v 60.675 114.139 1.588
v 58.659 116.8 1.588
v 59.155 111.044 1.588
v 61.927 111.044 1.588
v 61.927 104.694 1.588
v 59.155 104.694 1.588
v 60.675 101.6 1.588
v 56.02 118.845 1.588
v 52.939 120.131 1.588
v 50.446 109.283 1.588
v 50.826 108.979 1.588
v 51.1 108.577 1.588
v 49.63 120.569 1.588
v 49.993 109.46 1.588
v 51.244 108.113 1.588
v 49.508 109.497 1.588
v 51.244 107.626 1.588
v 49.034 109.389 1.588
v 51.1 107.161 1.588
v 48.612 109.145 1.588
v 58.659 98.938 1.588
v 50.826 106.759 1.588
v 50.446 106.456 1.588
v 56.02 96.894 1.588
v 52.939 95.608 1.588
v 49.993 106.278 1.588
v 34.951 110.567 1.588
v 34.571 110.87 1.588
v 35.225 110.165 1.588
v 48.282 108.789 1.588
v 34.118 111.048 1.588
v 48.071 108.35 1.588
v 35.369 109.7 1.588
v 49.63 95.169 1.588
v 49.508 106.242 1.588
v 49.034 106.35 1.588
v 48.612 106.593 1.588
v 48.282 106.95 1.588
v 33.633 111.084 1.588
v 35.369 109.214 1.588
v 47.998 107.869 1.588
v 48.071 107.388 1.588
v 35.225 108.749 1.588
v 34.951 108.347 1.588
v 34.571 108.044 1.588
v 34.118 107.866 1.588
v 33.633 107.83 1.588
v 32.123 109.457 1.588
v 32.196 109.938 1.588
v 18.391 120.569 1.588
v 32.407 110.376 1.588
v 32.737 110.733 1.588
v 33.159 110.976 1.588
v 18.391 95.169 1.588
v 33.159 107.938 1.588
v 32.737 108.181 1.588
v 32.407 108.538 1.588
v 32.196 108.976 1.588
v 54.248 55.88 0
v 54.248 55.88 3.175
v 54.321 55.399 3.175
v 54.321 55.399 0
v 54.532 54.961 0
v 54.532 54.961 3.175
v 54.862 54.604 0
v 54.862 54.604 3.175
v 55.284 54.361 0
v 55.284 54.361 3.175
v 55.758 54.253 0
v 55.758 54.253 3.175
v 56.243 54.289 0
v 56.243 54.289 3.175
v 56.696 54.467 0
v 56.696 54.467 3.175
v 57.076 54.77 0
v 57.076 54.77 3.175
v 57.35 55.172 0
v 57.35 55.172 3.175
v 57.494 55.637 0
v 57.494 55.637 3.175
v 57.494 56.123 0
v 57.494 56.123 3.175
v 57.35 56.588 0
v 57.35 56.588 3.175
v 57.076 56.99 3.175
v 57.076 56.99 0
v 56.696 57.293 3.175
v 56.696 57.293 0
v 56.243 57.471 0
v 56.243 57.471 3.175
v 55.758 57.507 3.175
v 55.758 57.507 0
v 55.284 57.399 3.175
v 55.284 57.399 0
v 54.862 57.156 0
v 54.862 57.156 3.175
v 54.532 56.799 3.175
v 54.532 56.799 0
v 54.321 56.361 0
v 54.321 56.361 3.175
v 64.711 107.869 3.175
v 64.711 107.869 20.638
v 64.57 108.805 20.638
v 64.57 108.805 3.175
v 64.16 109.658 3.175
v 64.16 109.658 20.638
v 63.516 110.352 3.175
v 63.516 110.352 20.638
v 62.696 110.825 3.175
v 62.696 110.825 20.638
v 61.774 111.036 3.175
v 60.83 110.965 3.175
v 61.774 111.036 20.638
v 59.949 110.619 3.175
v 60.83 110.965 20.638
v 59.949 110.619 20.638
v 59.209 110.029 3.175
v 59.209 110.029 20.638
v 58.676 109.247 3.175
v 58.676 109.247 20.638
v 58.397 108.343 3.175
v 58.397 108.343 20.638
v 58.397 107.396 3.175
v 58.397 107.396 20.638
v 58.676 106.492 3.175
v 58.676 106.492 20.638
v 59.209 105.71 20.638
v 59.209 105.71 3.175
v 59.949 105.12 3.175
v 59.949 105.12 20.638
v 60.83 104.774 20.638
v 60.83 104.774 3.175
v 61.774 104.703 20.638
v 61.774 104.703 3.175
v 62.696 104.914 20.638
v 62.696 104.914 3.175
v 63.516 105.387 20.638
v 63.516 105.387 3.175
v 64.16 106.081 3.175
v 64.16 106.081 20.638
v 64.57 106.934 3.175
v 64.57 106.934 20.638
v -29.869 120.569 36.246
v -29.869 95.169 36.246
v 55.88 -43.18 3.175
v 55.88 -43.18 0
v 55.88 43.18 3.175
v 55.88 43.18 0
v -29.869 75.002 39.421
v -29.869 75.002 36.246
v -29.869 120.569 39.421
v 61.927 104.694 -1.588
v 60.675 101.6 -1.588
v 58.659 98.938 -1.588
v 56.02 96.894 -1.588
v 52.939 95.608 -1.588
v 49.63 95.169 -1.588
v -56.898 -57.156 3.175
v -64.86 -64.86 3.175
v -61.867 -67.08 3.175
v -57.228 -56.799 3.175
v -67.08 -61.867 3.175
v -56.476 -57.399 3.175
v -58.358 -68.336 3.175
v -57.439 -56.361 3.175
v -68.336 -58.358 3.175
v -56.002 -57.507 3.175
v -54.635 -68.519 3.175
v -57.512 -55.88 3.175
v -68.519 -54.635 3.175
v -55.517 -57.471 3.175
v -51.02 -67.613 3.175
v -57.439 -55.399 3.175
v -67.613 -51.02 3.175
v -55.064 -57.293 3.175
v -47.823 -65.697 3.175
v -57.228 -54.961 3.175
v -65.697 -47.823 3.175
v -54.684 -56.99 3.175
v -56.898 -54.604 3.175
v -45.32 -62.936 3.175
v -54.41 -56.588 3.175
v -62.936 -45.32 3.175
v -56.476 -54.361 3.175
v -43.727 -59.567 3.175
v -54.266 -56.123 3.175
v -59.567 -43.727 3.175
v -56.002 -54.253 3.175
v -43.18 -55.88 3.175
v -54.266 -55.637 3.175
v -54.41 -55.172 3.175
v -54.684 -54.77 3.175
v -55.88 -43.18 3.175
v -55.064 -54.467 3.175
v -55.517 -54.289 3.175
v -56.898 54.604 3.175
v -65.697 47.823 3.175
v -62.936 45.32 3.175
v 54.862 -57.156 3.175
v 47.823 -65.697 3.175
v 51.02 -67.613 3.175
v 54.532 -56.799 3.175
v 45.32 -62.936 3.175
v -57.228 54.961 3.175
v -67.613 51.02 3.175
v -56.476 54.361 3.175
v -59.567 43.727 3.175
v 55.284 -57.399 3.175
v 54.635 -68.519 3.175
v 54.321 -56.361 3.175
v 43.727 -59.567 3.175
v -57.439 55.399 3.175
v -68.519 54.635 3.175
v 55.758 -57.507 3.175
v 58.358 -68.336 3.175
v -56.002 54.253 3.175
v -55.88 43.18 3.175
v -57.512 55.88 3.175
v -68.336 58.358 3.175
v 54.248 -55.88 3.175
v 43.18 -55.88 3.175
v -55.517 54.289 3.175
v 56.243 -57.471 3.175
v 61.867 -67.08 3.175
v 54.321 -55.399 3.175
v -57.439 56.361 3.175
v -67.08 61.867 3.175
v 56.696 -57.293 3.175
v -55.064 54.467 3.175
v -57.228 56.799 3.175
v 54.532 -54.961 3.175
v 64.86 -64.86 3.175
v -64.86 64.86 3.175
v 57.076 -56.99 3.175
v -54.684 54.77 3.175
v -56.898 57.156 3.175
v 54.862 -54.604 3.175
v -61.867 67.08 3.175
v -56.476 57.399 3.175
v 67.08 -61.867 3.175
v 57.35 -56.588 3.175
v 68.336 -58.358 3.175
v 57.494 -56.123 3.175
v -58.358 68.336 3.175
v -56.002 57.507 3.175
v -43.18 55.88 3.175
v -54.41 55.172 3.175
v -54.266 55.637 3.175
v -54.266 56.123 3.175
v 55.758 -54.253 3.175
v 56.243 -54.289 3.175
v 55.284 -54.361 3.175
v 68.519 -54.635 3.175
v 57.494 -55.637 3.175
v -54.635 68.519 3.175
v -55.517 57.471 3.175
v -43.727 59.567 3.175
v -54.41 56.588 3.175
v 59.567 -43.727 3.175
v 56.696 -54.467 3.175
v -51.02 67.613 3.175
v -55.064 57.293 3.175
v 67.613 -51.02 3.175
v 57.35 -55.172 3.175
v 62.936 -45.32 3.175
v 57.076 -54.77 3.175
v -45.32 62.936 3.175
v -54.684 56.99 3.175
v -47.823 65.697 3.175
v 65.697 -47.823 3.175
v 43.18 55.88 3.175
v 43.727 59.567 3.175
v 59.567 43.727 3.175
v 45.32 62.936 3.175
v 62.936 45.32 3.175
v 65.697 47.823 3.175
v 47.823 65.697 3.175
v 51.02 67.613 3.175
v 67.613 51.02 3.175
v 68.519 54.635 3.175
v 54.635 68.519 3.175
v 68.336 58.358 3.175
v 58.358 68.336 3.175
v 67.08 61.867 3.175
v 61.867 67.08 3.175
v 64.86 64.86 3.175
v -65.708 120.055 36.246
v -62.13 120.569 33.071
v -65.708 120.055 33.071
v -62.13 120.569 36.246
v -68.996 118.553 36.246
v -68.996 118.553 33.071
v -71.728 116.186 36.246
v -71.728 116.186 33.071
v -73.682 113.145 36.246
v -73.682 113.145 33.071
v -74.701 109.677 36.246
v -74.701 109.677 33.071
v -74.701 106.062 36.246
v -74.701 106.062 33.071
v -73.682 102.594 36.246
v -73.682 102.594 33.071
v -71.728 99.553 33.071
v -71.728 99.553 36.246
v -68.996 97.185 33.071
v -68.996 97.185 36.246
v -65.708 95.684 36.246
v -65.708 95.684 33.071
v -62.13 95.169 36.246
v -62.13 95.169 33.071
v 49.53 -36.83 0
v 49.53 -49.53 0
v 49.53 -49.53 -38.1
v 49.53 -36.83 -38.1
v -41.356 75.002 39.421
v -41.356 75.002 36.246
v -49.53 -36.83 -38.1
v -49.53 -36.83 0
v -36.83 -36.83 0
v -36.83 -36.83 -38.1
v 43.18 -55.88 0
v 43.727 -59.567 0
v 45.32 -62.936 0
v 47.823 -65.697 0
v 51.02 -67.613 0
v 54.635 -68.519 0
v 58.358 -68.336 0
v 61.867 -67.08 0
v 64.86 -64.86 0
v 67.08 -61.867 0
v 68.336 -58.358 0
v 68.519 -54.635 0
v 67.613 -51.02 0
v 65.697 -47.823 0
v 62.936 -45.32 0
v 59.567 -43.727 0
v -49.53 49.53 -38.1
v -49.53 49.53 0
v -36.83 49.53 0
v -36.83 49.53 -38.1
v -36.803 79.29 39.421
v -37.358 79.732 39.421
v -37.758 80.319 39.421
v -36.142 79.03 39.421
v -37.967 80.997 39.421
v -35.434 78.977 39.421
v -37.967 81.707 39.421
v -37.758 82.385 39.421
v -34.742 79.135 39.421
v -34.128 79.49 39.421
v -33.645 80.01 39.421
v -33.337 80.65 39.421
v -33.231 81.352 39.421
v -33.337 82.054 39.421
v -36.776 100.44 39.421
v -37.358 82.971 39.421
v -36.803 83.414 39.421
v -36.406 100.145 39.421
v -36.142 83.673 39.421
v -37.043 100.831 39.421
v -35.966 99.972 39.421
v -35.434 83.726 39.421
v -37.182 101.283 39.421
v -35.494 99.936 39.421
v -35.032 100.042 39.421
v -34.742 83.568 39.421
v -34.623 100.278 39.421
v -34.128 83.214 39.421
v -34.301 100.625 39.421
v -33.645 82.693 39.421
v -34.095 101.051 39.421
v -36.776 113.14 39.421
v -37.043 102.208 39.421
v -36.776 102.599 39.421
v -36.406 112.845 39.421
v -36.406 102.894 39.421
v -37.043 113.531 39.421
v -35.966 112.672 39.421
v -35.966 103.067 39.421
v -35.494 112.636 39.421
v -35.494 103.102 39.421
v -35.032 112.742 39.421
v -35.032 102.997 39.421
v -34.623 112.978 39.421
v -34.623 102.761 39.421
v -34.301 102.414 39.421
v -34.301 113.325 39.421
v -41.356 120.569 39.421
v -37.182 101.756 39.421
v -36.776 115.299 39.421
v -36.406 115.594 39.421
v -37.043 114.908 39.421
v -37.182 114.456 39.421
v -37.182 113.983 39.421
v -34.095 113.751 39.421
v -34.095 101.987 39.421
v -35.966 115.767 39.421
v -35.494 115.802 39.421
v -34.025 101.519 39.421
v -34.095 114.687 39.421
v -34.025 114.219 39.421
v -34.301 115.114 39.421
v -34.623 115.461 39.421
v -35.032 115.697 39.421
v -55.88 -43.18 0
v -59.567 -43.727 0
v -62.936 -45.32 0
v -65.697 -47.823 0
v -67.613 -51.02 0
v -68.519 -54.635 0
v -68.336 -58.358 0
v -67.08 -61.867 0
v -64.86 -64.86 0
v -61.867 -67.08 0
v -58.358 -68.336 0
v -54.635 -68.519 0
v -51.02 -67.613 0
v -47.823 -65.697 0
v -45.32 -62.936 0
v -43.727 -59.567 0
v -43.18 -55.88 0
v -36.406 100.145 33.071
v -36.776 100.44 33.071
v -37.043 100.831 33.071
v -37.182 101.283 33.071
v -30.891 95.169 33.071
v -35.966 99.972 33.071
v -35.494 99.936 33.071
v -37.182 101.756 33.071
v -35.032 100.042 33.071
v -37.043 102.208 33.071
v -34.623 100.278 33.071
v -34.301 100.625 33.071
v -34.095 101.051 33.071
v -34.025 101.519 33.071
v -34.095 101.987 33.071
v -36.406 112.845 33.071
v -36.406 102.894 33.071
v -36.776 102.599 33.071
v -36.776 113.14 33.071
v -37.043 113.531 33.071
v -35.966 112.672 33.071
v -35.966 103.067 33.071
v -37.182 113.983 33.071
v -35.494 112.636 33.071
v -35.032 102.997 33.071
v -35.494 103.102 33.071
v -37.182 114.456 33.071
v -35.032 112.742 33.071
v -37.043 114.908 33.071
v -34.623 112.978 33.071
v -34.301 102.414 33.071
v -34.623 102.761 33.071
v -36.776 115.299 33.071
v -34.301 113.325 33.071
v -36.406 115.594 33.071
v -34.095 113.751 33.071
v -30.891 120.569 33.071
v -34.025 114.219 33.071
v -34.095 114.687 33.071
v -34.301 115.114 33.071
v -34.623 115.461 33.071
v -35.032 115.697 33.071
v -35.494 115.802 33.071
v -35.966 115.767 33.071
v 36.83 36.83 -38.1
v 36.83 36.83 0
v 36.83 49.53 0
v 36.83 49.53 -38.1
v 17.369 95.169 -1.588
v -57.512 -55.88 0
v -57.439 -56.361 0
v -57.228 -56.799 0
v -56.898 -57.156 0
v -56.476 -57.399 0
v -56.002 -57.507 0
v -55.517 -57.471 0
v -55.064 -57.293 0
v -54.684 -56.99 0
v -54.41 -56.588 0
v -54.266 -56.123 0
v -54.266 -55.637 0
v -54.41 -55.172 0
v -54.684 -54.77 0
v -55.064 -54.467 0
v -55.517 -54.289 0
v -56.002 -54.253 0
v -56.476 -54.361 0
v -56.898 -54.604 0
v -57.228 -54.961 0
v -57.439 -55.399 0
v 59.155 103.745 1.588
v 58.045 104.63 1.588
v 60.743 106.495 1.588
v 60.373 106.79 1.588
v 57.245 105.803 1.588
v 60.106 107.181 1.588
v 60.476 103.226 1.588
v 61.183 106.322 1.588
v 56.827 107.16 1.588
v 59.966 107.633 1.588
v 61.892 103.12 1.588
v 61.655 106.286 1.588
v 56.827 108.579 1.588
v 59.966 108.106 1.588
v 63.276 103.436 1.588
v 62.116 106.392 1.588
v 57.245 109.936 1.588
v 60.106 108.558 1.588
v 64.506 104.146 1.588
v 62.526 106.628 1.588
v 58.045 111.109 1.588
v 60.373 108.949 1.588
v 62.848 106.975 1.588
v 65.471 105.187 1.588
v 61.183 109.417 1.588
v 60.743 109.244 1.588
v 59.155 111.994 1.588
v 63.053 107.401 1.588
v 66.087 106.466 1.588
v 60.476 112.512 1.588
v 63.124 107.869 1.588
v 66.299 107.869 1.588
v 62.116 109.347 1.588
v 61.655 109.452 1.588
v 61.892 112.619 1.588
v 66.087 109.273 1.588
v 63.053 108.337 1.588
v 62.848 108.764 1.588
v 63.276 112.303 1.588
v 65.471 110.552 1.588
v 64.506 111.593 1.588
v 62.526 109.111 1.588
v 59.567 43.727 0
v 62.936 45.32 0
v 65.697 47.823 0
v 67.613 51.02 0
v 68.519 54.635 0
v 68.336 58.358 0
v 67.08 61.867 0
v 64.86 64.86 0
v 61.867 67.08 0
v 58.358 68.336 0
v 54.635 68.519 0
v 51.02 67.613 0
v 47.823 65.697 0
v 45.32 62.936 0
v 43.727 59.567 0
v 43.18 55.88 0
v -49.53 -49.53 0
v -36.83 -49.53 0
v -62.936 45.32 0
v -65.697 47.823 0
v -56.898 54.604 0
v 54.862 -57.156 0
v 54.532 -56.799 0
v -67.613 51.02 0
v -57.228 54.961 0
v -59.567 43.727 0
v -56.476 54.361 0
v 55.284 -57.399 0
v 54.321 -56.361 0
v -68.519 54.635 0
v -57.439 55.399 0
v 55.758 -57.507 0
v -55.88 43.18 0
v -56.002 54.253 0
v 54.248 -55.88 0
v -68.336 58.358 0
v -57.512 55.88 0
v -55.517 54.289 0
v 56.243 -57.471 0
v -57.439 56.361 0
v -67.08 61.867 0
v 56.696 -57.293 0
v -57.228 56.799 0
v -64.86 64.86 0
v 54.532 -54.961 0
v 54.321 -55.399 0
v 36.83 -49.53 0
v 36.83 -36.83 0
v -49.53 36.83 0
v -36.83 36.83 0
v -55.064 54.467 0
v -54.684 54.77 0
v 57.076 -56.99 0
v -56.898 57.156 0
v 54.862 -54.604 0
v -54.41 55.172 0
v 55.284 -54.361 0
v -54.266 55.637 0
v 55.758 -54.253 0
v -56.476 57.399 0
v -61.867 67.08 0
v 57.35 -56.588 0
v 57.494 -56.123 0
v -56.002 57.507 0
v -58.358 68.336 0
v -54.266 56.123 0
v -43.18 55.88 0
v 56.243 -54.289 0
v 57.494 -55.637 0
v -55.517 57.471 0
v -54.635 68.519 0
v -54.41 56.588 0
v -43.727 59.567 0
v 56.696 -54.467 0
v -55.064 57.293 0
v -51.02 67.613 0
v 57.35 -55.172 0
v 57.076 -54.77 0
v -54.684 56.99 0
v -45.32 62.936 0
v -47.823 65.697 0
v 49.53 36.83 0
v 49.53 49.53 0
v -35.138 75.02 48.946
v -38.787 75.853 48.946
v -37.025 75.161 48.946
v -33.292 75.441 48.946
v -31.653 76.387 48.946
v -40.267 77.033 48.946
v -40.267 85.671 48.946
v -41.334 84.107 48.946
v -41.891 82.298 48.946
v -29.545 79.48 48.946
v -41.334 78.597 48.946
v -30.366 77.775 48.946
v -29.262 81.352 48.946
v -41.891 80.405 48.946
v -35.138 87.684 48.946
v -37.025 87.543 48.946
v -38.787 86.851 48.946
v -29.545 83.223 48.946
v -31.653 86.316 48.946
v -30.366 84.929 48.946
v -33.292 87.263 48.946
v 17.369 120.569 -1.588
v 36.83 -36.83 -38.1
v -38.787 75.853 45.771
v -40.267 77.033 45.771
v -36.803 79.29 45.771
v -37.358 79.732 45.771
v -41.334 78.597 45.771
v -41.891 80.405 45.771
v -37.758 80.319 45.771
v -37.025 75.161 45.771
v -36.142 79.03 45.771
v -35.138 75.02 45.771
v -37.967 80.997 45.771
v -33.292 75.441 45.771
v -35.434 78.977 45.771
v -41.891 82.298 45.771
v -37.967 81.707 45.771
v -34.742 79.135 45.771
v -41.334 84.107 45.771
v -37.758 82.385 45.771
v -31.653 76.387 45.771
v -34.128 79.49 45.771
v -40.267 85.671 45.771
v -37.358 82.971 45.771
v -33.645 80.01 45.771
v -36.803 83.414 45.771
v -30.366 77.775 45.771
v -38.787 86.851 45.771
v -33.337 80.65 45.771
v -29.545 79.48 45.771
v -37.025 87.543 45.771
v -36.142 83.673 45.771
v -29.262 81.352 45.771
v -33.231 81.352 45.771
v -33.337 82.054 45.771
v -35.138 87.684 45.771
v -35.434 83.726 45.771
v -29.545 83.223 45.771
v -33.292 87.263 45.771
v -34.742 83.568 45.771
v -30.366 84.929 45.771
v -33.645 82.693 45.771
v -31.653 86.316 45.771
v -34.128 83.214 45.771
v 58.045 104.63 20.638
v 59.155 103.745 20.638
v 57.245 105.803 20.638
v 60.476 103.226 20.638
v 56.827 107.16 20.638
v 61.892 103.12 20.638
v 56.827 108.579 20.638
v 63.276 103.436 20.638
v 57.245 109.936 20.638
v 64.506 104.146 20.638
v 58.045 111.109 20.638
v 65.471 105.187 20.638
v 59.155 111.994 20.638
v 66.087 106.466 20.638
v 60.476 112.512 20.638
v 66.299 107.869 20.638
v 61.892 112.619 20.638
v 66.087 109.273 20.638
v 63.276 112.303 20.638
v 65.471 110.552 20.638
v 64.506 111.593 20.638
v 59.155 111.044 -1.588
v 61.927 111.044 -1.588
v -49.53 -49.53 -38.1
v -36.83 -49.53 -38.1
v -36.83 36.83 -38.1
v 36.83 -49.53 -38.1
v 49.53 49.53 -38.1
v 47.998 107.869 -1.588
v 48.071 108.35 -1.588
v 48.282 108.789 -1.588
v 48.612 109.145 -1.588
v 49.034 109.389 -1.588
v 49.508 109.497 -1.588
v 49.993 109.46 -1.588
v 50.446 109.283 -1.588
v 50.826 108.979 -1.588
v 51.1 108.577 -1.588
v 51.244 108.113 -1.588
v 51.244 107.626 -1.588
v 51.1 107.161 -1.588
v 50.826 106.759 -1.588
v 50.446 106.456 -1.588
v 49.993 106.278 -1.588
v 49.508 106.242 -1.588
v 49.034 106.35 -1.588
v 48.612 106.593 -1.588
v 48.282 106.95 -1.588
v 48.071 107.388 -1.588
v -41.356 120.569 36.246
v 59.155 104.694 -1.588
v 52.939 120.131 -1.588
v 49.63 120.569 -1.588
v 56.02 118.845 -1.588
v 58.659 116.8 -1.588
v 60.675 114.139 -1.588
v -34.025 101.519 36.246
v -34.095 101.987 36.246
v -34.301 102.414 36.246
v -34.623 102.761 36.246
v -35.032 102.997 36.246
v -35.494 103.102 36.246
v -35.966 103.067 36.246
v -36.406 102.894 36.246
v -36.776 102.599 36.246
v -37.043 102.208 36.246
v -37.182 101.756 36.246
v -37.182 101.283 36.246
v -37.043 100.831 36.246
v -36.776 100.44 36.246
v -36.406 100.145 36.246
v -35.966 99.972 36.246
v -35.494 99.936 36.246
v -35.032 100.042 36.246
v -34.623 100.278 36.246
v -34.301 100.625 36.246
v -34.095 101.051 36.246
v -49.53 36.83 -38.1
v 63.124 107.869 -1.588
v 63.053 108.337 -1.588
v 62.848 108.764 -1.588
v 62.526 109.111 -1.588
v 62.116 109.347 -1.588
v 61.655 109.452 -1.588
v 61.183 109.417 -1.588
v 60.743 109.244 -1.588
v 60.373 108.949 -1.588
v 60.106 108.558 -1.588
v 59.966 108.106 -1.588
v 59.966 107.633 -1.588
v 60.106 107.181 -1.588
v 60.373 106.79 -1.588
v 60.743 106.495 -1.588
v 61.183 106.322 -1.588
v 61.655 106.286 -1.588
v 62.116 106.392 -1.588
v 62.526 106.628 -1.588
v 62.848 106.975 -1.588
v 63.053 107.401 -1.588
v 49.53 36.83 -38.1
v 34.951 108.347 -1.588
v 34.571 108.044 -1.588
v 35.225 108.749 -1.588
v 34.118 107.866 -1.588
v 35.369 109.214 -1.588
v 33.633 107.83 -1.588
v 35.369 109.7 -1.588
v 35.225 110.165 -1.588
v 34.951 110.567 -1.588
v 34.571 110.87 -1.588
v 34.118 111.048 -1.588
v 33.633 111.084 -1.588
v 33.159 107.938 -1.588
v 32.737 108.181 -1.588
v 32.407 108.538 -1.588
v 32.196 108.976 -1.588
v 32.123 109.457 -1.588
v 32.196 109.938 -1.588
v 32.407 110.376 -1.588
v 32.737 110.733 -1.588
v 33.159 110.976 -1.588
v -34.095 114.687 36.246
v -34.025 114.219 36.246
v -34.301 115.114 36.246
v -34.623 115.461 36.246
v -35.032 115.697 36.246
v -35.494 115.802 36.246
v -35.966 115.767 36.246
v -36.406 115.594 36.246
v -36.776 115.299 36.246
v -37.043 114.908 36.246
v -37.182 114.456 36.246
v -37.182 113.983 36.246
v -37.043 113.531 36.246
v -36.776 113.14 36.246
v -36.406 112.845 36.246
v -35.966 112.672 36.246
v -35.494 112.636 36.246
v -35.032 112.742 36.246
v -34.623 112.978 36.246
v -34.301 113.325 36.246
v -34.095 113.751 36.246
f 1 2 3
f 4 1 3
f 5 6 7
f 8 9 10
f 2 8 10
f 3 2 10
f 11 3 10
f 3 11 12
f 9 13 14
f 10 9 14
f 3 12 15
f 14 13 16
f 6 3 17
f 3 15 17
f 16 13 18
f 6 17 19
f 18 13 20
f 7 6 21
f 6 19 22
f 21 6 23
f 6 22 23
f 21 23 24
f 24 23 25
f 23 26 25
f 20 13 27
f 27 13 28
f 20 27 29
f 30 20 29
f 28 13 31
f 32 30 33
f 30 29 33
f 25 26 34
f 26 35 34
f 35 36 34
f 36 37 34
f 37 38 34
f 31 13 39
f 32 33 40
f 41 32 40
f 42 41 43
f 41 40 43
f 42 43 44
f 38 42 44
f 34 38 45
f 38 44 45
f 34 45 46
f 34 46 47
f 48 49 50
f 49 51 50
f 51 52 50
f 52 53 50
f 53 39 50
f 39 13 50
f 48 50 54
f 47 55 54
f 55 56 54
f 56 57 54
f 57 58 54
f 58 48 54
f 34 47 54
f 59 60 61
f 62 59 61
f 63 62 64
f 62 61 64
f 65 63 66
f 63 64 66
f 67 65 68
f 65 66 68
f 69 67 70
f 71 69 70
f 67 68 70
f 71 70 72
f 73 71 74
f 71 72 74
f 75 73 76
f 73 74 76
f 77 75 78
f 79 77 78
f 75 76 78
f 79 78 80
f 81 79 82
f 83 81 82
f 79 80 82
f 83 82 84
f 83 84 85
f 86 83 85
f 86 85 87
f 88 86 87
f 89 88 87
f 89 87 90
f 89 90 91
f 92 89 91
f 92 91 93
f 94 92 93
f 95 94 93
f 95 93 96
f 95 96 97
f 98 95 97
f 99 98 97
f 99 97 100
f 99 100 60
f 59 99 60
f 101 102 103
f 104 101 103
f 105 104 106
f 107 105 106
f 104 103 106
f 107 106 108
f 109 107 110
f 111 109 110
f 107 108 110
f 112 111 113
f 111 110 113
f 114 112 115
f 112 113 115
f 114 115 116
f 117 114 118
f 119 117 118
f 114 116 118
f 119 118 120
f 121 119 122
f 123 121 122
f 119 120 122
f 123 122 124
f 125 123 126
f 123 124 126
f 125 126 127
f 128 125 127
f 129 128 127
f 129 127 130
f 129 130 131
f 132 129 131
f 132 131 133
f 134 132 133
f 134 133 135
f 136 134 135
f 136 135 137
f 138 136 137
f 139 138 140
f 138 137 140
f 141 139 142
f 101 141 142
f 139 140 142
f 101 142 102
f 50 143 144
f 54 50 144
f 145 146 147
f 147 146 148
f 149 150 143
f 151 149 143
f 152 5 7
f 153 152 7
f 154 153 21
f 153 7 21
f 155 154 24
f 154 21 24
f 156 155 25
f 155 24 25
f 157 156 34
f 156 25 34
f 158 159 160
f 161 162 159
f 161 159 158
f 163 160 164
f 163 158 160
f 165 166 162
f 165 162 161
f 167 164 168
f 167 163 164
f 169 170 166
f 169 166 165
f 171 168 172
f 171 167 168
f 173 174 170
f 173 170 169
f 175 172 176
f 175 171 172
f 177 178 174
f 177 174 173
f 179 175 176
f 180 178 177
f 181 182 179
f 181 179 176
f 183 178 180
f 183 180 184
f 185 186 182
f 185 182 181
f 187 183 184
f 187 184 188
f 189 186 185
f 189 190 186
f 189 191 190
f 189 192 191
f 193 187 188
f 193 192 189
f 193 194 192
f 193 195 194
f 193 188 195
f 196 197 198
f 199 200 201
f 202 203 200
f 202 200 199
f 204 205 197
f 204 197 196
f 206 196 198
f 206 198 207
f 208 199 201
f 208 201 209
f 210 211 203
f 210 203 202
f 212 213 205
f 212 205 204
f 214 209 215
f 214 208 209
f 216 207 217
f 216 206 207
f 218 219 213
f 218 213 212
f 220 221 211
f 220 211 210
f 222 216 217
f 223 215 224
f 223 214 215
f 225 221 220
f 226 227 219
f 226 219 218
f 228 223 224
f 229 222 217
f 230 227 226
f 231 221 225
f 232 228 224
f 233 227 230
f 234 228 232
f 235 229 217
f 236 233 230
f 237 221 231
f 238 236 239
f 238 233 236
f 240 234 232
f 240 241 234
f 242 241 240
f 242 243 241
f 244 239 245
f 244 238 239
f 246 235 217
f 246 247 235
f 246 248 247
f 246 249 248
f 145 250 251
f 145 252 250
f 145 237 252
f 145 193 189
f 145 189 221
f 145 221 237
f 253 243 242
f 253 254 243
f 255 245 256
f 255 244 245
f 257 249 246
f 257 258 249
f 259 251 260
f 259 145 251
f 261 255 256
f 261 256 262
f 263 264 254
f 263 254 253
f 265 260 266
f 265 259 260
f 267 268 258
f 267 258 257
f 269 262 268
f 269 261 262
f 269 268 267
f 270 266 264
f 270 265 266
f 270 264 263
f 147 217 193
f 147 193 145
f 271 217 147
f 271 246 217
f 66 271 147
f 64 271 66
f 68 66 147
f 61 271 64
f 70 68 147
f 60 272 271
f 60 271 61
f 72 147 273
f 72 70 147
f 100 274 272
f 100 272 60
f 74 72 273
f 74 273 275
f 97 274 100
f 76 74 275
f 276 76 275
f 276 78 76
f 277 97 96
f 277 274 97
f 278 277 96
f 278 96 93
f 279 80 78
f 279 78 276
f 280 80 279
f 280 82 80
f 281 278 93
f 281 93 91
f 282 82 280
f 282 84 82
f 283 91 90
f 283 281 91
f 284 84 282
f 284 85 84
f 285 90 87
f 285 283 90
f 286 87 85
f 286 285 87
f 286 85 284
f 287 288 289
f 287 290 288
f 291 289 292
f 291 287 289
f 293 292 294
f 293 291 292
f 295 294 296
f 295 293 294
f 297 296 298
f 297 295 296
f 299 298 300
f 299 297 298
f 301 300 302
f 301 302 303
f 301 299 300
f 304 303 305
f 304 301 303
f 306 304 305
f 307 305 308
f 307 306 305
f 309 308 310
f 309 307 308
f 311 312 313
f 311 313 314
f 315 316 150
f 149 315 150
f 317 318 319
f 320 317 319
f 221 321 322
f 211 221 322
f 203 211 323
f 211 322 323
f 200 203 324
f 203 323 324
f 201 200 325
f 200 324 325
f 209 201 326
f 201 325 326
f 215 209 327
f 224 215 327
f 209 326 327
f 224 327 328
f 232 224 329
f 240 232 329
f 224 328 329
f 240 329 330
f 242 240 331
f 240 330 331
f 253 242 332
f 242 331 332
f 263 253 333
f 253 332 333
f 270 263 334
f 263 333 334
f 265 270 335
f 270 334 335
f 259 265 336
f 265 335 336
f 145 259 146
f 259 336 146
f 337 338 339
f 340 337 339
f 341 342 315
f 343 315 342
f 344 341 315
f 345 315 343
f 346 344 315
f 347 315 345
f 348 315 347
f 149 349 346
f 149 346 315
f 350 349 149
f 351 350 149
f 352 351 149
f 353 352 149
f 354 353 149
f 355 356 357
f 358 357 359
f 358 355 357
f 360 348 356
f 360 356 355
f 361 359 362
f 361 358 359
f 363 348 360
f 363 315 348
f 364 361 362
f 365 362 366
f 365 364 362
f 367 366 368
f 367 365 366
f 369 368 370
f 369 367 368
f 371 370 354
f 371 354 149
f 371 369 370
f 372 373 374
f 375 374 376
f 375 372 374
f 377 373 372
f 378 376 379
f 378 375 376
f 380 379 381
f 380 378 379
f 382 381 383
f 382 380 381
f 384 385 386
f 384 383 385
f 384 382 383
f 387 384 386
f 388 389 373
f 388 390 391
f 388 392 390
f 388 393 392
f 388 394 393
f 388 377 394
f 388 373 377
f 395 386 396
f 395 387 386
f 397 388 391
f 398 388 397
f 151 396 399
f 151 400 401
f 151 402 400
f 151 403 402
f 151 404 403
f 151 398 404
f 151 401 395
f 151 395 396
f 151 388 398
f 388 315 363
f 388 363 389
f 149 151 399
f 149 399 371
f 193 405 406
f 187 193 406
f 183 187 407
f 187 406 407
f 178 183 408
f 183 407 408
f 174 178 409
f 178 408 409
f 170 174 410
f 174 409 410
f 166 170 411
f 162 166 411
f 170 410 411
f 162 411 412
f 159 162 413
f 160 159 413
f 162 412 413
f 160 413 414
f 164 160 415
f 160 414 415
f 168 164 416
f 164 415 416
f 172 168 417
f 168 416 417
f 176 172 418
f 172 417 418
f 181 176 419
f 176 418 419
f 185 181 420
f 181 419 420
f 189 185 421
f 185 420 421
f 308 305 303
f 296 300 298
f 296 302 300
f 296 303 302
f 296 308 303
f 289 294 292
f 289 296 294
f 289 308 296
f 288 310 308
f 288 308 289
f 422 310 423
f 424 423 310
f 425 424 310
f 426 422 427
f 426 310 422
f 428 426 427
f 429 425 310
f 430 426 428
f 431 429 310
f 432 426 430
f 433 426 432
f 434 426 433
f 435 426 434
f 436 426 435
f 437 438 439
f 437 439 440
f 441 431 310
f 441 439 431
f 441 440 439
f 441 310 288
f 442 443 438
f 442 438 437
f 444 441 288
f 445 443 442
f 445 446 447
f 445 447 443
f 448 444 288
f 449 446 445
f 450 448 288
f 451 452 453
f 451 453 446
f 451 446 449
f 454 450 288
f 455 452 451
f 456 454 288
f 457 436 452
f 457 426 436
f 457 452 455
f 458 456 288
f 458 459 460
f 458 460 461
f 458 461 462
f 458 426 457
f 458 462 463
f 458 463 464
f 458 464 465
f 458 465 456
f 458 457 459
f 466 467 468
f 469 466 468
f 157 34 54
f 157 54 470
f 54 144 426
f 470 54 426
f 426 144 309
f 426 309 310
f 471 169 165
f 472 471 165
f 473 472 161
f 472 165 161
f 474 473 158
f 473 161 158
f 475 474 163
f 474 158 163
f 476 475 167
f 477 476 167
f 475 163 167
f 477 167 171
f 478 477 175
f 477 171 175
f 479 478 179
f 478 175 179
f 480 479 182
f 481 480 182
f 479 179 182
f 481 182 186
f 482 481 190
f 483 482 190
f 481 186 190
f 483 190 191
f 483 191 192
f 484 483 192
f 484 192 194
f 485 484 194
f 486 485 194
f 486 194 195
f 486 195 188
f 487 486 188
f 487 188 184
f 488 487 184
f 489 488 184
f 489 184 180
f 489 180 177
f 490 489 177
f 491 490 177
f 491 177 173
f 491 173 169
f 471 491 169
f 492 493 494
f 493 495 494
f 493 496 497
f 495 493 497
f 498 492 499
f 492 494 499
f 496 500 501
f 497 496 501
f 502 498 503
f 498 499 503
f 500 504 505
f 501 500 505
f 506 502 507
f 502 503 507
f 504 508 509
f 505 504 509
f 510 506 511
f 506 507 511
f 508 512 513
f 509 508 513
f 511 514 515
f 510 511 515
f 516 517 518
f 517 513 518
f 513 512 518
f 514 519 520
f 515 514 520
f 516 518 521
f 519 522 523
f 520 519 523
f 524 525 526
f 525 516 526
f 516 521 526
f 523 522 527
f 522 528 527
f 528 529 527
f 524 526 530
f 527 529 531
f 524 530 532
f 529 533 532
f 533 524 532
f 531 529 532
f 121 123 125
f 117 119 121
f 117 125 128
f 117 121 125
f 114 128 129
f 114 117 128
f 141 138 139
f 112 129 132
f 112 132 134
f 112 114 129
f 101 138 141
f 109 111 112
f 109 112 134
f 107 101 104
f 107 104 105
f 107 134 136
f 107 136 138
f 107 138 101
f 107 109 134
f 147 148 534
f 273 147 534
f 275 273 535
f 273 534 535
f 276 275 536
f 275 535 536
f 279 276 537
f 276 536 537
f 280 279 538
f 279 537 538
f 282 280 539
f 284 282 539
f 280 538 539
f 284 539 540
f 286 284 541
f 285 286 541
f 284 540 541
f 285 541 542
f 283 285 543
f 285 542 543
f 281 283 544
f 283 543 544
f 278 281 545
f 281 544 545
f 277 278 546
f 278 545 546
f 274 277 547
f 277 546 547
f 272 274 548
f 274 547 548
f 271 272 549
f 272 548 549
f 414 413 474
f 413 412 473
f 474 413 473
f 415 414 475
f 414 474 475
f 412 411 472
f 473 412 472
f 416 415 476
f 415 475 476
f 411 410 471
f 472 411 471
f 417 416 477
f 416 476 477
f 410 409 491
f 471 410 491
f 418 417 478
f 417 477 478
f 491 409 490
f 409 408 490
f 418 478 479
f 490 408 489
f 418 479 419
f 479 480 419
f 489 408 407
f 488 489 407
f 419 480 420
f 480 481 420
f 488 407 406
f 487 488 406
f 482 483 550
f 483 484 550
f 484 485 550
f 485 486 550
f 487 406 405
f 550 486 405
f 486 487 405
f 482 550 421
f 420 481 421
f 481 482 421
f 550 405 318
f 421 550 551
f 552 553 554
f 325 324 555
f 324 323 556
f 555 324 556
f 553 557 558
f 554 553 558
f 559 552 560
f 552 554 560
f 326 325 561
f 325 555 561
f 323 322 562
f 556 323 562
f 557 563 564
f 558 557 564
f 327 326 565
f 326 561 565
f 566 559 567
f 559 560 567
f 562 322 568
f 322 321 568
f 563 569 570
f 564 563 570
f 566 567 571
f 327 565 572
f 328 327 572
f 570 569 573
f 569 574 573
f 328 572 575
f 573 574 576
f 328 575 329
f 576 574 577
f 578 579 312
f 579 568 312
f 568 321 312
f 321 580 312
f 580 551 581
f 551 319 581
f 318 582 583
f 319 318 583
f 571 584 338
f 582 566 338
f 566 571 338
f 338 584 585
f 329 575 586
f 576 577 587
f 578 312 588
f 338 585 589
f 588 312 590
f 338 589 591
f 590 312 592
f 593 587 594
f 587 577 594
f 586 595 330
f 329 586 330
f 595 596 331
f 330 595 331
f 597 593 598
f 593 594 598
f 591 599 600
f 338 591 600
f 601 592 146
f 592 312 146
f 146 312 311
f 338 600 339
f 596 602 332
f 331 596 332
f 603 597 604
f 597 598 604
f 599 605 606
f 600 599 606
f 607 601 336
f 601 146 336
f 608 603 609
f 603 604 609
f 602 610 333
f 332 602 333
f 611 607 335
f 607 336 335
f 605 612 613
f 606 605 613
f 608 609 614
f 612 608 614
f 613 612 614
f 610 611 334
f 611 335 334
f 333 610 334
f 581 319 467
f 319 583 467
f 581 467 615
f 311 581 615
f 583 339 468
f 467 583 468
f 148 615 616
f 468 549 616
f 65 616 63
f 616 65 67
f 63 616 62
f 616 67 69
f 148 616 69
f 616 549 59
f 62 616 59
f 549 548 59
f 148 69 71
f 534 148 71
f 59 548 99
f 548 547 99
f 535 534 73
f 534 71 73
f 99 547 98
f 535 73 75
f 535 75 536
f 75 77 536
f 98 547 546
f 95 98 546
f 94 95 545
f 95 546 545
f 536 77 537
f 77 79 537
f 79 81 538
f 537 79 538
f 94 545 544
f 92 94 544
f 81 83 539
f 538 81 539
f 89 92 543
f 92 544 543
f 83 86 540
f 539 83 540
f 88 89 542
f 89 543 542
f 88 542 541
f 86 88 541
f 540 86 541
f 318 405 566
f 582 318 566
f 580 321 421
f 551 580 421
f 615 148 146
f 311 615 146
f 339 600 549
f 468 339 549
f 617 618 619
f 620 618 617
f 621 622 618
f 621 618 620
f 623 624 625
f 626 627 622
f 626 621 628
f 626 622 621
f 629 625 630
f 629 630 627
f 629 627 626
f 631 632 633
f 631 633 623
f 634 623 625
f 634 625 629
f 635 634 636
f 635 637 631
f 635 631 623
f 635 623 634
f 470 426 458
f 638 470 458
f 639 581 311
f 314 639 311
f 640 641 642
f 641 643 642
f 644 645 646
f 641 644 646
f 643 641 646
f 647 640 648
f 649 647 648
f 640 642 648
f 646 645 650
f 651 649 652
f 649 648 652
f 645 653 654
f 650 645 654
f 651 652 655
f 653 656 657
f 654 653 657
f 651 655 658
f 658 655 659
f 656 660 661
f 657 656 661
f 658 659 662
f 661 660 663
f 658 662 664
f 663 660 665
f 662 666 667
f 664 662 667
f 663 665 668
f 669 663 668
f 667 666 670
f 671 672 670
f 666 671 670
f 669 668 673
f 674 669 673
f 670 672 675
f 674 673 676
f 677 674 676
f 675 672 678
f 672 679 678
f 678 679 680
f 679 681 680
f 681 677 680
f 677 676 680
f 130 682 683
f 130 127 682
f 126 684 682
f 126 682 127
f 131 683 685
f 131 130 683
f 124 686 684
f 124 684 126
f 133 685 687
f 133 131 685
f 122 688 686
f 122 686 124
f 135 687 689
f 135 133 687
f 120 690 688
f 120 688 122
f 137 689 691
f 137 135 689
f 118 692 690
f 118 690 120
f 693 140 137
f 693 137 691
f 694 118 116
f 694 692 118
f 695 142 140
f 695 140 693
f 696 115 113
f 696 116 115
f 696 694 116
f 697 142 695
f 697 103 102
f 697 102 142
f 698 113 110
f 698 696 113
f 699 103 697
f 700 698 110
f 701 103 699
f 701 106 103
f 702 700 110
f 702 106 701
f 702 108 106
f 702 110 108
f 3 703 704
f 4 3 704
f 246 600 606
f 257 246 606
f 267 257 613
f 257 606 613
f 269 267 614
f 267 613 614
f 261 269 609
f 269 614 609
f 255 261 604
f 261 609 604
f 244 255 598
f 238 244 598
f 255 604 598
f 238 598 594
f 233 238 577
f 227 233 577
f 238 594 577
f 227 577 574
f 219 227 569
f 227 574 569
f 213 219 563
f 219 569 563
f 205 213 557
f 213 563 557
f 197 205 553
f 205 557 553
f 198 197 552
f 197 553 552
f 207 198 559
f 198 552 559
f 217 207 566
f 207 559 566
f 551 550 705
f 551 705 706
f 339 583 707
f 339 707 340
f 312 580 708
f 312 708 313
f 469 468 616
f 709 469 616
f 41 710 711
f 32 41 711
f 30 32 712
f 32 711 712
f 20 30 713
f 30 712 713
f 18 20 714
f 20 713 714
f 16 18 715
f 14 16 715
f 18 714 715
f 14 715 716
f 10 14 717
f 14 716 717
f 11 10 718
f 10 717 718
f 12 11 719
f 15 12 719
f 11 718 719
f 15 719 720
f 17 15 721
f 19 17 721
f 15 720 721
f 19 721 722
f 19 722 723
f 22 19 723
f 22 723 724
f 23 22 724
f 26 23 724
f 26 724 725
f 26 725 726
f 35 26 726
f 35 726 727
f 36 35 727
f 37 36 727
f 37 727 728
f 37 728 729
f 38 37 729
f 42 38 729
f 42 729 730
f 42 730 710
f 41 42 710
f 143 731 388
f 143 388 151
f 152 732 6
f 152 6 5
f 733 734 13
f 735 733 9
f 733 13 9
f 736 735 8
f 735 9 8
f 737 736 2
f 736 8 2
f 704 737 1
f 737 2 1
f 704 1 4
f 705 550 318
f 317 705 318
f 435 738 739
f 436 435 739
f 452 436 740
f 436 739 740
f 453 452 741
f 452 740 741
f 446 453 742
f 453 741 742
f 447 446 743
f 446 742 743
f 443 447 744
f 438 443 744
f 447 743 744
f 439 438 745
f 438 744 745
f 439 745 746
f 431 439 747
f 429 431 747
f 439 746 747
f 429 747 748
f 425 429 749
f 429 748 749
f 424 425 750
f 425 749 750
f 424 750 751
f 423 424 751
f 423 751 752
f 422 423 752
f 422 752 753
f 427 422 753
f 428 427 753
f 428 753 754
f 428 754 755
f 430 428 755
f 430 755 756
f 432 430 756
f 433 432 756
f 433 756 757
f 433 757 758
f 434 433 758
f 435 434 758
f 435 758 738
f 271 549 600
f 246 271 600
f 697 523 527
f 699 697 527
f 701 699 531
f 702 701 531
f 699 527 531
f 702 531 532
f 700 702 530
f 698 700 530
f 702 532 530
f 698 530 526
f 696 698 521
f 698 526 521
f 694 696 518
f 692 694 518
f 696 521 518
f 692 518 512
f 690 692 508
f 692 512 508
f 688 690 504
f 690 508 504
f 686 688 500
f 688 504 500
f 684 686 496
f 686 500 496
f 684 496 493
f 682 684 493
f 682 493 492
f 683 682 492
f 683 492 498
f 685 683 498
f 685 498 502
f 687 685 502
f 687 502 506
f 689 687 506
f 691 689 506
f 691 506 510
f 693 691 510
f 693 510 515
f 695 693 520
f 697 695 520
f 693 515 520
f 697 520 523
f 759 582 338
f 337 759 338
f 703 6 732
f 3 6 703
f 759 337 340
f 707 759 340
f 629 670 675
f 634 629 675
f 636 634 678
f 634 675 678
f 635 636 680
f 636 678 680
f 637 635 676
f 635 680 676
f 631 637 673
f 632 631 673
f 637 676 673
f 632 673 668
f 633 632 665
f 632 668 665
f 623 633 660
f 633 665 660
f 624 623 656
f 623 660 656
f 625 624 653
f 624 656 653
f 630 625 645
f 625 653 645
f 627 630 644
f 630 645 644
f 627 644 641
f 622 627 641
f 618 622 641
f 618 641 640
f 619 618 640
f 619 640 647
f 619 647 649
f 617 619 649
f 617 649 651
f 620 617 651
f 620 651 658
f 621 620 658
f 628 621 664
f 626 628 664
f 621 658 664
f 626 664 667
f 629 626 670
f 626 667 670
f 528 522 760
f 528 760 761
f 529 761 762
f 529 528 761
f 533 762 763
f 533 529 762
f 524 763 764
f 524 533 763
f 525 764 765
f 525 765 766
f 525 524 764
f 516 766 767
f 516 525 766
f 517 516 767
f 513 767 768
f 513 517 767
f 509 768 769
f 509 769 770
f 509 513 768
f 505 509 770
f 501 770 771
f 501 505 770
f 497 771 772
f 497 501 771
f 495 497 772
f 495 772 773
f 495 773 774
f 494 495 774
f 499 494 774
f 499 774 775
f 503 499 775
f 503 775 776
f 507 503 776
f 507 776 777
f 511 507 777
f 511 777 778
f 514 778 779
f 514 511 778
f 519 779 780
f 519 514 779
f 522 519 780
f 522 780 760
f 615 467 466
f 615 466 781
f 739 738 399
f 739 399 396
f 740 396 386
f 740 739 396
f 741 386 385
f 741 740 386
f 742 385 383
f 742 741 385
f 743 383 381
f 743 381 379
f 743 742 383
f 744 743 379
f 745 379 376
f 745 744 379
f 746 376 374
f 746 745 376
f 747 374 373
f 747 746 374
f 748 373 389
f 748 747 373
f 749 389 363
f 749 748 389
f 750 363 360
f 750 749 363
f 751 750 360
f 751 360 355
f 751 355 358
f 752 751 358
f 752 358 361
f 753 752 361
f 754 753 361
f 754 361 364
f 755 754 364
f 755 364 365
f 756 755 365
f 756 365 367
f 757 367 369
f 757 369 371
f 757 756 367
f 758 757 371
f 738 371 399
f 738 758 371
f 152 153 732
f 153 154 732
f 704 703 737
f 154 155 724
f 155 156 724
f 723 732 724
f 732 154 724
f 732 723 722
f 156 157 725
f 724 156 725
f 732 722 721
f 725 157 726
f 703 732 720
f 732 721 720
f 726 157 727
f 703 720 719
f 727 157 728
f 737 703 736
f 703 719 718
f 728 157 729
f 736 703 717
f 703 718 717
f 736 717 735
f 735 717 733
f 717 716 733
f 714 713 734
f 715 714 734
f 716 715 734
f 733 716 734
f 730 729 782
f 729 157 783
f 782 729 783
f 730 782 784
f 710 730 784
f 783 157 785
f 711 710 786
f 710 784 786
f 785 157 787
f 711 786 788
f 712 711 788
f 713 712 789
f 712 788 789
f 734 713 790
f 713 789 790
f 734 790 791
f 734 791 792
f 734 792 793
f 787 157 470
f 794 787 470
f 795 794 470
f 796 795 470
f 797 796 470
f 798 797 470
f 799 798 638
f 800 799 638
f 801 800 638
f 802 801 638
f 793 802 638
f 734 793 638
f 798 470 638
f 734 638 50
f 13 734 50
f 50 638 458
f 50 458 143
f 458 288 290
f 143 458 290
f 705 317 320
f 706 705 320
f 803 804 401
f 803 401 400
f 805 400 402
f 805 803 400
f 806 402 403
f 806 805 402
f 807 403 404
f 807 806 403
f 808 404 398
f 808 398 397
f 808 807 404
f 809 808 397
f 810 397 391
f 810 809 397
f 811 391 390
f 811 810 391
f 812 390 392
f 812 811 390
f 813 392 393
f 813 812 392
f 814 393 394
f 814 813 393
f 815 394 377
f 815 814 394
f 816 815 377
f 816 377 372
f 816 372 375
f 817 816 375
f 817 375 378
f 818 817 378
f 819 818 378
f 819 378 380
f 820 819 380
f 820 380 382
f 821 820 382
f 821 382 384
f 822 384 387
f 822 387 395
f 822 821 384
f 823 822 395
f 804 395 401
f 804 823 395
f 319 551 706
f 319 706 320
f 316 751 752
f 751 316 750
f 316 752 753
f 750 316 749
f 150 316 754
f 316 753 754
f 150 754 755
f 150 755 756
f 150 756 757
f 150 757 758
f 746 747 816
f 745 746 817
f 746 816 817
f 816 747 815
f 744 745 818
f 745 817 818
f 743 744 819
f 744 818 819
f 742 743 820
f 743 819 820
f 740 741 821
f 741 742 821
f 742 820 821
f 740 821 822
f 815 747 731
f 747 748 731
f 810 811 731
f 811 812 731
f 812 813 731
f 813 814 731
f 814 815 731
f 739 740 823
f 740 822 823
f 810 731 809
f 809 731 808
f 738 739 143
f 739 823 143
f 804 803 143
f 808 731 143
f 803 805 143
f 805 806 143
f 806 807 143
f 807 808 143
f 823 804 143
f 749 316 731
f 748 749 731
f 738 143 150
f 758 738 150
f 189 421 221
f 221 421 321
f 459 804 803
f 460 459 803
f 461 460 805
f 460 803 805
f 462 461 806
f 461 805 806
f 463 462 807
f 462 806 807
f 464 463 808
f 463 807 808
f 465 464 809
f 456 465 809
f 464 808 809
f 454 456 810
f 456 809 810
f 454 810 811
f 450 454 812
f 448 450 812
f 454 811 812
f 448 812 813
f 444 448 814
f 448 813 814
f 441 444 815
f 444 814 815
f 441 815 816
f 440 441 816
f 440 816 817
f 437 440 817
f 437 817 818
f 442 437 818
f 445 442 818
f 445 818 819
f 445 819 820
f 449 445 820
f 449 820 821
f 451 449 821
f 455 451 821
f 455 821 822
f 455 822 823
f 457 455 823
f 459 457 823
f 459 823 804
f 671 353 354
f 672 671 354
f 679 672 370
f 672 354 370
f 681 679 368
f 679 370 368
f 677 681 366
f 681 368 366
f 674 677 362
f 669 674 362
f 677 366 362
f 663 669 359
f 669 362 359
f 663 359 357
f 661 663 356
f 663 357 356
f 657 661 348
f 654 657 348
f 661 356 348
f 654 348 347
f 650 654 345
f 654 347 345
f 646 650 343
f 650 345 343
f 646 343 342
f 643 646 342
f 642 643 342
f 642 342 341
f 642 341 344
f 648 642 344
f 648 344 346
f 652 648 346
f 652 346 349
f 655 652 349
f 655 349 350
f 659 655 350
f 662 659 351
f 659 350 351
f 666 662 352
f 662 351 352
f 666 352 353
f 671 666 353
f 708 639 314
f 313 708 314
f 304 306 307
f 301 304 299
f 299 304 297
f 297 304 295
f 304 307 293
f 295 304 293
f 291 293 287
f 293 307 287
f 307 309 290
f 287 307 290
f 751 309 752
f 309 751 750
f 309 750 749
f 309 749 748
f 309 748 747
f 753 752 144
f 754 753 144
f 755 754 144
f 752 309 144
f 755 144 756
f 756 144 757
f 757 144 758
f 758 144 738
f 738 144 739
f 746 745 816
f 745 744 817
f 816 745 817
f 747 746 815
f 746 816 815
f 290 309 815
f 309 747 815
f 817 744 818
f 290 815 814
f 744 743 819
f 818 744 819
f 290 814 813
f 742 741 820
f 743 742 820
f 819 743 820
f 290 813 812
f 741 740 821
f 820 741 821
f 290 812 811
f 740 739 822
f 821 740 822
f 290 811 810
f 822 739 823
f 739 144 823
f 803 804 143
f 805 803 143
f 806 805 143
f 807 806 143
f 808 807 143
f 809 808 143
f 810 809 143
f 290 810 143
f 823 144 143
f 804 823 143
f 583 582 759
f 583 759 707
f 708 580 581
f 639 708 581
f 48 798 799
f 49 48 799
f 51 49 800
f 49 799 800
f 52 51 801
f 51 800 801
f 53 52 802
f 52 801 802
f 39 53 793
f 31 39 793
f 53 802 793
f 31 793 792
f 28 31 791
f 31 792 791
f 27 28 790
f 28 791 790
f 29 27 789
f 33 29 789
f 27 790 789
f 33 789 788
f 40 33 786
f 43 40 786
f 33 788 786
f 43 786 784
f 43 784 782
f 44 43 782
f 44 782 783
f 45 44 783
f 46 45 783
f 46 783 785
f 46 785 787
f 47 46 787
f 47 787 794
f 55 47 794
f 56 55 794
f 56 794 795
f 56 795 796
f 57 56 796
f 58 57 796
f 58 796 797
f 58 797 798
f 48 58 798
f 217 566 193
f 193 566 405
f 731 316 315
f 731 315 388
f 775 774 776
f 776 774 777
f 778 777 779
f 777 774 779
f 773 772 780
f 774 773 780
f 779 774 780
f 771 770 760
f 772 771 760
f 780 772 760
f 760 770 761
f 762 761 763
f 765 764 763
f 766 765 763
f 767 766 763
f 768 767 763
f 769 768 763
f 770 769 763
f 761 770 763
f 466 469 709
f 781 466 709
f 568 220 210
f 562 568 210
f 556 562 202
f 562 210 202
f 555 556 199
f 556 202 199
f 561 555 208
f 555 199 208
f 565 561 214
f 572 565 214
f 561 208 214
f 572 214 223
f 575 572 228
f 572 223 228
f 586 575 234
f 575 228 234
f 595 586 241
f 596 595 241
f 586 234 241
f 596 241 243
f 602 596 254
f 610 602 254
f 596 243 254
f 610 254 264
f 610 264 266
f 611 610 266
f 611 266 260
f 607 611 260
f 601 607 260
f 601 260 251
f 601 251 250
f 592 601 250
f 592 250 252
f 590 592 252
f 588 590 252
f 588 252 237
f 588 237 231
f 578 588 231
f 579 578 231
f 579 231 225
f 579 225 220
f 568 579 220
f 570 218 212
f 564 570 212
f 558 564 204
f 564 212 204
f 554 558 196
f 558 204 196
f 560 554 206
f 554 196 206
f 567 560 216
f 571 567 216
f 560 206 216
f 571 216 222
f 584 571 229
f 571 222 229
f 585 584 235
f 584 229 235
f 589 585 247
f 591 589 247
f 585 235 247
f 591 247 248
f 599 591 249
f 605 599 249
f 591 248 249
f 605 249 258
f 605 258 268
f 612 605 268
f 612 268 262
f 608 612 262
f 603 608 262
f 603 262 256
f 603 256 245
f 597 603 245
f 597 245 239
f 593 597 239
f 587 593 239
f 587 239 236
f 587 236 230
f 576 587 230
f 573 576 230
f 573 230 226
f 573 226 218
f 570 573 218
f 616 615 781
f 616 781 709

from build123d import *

# Parameters (mm, degrees)
F0_W      = 82.8061997521
F0_H      = 12.7
F2_DEPTH  = 3.175
F3_D      = 3.2639
F7_W      = 25.4
F7_H      = 3.175
F9_W      = 12.7
F9_H      = 3.175
F11_W     = 12.7
F11_H     = 3.175
F14_D     = 3.2639
F16_D     = 3.2639
F17_W     = 6.35
F17_H     = 6.35
F18_DEPTH = 3.176
F19_R     = 1.5875
F20_DEPTH = 3.175
F21_R     = 4.7625
F22_DEPTH = 19.05
F23_R     = 3.175
F24_DEPTH = 17.4625
F26_R     = 1.5875
F27_DEPTH = 25.4
F28_W     = 11.4867726283
F28_H     = 45.5676
F28_R     = 1.5875
F29_DEPTH = 3.175
F30_R     = 2.38125
F31_DEPTH = 6.35
F32_R     = 6.35
F33_DEPTH = 3.175
F34_W     = 12.7
F34_H     = 12.7
F35_DEPTH = 38.1


with BuildPart() as f2:
    # F0 (on Top) → F2 (new body)
    with BuildSketch(Plane.XY):
        with BuildLine():
            Line((-43.18, 43.18), (-43.18, 55.88))
            ThreePointArc((-43.18, 55.88), (-64.8602561211, 64.8602561211), (-55.88, 43.18))
            Line((-55.88, 43.18), (-55.88, -43.18))
            ThreePointArc((-55.88, -43.18), (-64.8602561211, -64.8602561211), (-43.18, -55.88))
            Line((-43.18, -55.88), (43.18, -55.88))
            ThreePointArc((43.18, -55.88), (64.8602561211, -64.8602561211), (55.88, -43.18))
            Line((55.88, -43.18), (55.88, 43.18))
            ThreePointArc((55.88, 43.18), (64.8602561211, 64.8602561211), (43.18, 55.88))
            Line((43.18, 55.88), (39.6261997521, 55.88))
            Line((39.6261997521, 55.88), (39.6261997521, 43.18))
            Line((39.6261997521, 43.18), (-43.18, 43.18))
        make_face()
        with Locations((-1.776900124, 49.53)):
            Rectangle(F0_W, F0_H)
    extrude(amount=F2_DEPTH)

    # F3 (through all)
    with Locations(Plane(origin=(0, 0, 0), x_dir=(1, 0, 0), z_dir=(0, 0, -1))):
        with Locations((-55.88, -55.88), (55.88, -55.88), (-55.88, 55.88), (55.88, 55.88)):
            Hole(F3_D / 2)

    # F34 (on face) → F35 (join)
    with BuildSketch(Plane.XY):
        with Locations((-43.18, -43.18)):
            Rectangle(F34_W, F34_H)
        with Locations((43.18, -43.18)):
            Rectangle(F34_W, F34_H)
        with Locations((43.18, 43.18)):
            Rectangle(F34_W, F34_H)
        with Locations((-43.18, 43.18)):
            Rectangle(F34_W, F34_H)
    extrude(amount=-F35_DEPTH)


with BuildPart() as f8:
    # F8: sweep along a path in F5
    with BuildLine(Plane.XZ.offset(-107.8693939435)) as f8_path:
        Line((49.630001771, 0), (17.880001771, 0))
        Line((17.880001771, 0), (-30.379998229, 34.6588875541))
        Line((-30.379998229, 34.6588875541), (-62.129998229, 34.6588875541))
    # F7 (on line) → F8 (sweep)
    with BuildSketch(Plane.YZ.offset(49.630001771)):
        with Locations((107.8693939435, 0)):
            Rectangle(F7_W, F7_H)
    sweep(path=f8_path.line, transition=Transition.RIGHT)

    # F9 (on face) → F10 (revolve)
    with BuildSketch(Plane.YZ.offset(49.630001771)):
        with Locations((114.2193939435, 0)):
            Rectangle(F9_W, F9_H)
    revolve(axis=Axis((49.630001771, 107.8693939435, 0), (0, 0, -1)))

    # F11 (on face) → F12 (revolve)
    with BuildSketch(Plane(origin=(-62.129998229, 0, 0), x_dir=(0, -1, 0), z_dir=(-1, 0, 0))):
        with Locations((-101.5193939435, 34.6588875541)):
            Rectangle(F11_W, F11_H)
    revolve(axis=Axis((-62.129998229, 107.8693939435, 34.6588875541), (0, 0, 1)))

    # F14 (through all)
    with Locations(Plane.XY.offset(1.5875)):
        with Locations((49.630001771, 107.8693939435)):
            Hole(F14_D / 2)

    # F16 (through all)
    with Locations(Plane.XY.offset(1.5875)):
        with Locations((33.755001771, 109.4568939435)):
            Hole(F16_D / 2)

    # F17 (on face) → F18 (cut, through all)
    with BuildSketch(Plane.XY.offset(1.5875)):
        with Locations((62.330001771, 107.8693939435)):
            Rectangle(F17_W, F17_H)
    extrude(amount=-F18_DEPTH, mode=Mode.SUBTRACT)

    # F26 (on face) → F27 (cut)
    with BuildSketch(Plane.XY.offset(36.2463875541)):
        with Locations((-35.612398229, 114.2193939435)):
            Circle(F26_R)
        with Locations((-35.612398229, 101.5193939435)):
            Circle(F26_R)
    extrude(amount=-F27_DEPTH, mode=Mode.SUBTRACT)


with BuildPart() as f20:
    # F19 (on face) → F20 (new body)
    with BuildSketch(Plane.XY.offset(1.5875)):
        with Locations((61.536251771, 107.8693939435)):
            Circle(F19_R)
    extrude(amount=-F20_DEPTH)

    # F21 (on face) → F22 (join)
    with BuildSketch(Plane.XY.offset(1.5875)):
        with Locations((61.536251771, 107.8693939435)):
            Circle(F21_R)
    extrude(amount=F22_DEPTH)

    # F23 (on face) → F24 (cut)
    with BuildSketch(Plane.XY.offset(20.6375)):
        with Locations((61.536251771, 107.8693939435)):
            Circle(F23_R)
    extrude(amount=-F24_DEPTH, mode=Mode.SUBTRACT)


with BuildPart() as f29:
    # F28 (on face) → F29 (new body)
    with BuildSketch(Plane.XY.offset(36.2463875541)):
        with Locations((-35.612398229, 97.7855939435)):
            Rectangle(F28_W, F28_H)
        with Locations((-35.612398229, 114.2193939435)):
            Circle(F28_R, mode=Mode.SUBTRACT)
        with Locations((-35.612398229, 101.5193939435)):
            Circle(F28_R, mode=Mode.SUBTRACT)
    extrude(amount=F29_DEPTH)

    # F30 (on face) → F31 (join)
    with BuildSketch(Plane.XY.offset(39.4213875541)):
        with Locations((-35.612398229, 81.3517939435)):
            Circle(F30_R)
    extrude(amount=F31_DEPTH)

    # F32 (on face) → F33 (join)
    with BuildSketch(Plane.XY.offset(45.7713875541)):
        with Locations((-35.612398229, 81.3517939435)):
            Circle(F32_R)
    extrude(amount=F33_DEPTH)


solid = Compound([f2.part, f8.part, f20.part, f29.part])
